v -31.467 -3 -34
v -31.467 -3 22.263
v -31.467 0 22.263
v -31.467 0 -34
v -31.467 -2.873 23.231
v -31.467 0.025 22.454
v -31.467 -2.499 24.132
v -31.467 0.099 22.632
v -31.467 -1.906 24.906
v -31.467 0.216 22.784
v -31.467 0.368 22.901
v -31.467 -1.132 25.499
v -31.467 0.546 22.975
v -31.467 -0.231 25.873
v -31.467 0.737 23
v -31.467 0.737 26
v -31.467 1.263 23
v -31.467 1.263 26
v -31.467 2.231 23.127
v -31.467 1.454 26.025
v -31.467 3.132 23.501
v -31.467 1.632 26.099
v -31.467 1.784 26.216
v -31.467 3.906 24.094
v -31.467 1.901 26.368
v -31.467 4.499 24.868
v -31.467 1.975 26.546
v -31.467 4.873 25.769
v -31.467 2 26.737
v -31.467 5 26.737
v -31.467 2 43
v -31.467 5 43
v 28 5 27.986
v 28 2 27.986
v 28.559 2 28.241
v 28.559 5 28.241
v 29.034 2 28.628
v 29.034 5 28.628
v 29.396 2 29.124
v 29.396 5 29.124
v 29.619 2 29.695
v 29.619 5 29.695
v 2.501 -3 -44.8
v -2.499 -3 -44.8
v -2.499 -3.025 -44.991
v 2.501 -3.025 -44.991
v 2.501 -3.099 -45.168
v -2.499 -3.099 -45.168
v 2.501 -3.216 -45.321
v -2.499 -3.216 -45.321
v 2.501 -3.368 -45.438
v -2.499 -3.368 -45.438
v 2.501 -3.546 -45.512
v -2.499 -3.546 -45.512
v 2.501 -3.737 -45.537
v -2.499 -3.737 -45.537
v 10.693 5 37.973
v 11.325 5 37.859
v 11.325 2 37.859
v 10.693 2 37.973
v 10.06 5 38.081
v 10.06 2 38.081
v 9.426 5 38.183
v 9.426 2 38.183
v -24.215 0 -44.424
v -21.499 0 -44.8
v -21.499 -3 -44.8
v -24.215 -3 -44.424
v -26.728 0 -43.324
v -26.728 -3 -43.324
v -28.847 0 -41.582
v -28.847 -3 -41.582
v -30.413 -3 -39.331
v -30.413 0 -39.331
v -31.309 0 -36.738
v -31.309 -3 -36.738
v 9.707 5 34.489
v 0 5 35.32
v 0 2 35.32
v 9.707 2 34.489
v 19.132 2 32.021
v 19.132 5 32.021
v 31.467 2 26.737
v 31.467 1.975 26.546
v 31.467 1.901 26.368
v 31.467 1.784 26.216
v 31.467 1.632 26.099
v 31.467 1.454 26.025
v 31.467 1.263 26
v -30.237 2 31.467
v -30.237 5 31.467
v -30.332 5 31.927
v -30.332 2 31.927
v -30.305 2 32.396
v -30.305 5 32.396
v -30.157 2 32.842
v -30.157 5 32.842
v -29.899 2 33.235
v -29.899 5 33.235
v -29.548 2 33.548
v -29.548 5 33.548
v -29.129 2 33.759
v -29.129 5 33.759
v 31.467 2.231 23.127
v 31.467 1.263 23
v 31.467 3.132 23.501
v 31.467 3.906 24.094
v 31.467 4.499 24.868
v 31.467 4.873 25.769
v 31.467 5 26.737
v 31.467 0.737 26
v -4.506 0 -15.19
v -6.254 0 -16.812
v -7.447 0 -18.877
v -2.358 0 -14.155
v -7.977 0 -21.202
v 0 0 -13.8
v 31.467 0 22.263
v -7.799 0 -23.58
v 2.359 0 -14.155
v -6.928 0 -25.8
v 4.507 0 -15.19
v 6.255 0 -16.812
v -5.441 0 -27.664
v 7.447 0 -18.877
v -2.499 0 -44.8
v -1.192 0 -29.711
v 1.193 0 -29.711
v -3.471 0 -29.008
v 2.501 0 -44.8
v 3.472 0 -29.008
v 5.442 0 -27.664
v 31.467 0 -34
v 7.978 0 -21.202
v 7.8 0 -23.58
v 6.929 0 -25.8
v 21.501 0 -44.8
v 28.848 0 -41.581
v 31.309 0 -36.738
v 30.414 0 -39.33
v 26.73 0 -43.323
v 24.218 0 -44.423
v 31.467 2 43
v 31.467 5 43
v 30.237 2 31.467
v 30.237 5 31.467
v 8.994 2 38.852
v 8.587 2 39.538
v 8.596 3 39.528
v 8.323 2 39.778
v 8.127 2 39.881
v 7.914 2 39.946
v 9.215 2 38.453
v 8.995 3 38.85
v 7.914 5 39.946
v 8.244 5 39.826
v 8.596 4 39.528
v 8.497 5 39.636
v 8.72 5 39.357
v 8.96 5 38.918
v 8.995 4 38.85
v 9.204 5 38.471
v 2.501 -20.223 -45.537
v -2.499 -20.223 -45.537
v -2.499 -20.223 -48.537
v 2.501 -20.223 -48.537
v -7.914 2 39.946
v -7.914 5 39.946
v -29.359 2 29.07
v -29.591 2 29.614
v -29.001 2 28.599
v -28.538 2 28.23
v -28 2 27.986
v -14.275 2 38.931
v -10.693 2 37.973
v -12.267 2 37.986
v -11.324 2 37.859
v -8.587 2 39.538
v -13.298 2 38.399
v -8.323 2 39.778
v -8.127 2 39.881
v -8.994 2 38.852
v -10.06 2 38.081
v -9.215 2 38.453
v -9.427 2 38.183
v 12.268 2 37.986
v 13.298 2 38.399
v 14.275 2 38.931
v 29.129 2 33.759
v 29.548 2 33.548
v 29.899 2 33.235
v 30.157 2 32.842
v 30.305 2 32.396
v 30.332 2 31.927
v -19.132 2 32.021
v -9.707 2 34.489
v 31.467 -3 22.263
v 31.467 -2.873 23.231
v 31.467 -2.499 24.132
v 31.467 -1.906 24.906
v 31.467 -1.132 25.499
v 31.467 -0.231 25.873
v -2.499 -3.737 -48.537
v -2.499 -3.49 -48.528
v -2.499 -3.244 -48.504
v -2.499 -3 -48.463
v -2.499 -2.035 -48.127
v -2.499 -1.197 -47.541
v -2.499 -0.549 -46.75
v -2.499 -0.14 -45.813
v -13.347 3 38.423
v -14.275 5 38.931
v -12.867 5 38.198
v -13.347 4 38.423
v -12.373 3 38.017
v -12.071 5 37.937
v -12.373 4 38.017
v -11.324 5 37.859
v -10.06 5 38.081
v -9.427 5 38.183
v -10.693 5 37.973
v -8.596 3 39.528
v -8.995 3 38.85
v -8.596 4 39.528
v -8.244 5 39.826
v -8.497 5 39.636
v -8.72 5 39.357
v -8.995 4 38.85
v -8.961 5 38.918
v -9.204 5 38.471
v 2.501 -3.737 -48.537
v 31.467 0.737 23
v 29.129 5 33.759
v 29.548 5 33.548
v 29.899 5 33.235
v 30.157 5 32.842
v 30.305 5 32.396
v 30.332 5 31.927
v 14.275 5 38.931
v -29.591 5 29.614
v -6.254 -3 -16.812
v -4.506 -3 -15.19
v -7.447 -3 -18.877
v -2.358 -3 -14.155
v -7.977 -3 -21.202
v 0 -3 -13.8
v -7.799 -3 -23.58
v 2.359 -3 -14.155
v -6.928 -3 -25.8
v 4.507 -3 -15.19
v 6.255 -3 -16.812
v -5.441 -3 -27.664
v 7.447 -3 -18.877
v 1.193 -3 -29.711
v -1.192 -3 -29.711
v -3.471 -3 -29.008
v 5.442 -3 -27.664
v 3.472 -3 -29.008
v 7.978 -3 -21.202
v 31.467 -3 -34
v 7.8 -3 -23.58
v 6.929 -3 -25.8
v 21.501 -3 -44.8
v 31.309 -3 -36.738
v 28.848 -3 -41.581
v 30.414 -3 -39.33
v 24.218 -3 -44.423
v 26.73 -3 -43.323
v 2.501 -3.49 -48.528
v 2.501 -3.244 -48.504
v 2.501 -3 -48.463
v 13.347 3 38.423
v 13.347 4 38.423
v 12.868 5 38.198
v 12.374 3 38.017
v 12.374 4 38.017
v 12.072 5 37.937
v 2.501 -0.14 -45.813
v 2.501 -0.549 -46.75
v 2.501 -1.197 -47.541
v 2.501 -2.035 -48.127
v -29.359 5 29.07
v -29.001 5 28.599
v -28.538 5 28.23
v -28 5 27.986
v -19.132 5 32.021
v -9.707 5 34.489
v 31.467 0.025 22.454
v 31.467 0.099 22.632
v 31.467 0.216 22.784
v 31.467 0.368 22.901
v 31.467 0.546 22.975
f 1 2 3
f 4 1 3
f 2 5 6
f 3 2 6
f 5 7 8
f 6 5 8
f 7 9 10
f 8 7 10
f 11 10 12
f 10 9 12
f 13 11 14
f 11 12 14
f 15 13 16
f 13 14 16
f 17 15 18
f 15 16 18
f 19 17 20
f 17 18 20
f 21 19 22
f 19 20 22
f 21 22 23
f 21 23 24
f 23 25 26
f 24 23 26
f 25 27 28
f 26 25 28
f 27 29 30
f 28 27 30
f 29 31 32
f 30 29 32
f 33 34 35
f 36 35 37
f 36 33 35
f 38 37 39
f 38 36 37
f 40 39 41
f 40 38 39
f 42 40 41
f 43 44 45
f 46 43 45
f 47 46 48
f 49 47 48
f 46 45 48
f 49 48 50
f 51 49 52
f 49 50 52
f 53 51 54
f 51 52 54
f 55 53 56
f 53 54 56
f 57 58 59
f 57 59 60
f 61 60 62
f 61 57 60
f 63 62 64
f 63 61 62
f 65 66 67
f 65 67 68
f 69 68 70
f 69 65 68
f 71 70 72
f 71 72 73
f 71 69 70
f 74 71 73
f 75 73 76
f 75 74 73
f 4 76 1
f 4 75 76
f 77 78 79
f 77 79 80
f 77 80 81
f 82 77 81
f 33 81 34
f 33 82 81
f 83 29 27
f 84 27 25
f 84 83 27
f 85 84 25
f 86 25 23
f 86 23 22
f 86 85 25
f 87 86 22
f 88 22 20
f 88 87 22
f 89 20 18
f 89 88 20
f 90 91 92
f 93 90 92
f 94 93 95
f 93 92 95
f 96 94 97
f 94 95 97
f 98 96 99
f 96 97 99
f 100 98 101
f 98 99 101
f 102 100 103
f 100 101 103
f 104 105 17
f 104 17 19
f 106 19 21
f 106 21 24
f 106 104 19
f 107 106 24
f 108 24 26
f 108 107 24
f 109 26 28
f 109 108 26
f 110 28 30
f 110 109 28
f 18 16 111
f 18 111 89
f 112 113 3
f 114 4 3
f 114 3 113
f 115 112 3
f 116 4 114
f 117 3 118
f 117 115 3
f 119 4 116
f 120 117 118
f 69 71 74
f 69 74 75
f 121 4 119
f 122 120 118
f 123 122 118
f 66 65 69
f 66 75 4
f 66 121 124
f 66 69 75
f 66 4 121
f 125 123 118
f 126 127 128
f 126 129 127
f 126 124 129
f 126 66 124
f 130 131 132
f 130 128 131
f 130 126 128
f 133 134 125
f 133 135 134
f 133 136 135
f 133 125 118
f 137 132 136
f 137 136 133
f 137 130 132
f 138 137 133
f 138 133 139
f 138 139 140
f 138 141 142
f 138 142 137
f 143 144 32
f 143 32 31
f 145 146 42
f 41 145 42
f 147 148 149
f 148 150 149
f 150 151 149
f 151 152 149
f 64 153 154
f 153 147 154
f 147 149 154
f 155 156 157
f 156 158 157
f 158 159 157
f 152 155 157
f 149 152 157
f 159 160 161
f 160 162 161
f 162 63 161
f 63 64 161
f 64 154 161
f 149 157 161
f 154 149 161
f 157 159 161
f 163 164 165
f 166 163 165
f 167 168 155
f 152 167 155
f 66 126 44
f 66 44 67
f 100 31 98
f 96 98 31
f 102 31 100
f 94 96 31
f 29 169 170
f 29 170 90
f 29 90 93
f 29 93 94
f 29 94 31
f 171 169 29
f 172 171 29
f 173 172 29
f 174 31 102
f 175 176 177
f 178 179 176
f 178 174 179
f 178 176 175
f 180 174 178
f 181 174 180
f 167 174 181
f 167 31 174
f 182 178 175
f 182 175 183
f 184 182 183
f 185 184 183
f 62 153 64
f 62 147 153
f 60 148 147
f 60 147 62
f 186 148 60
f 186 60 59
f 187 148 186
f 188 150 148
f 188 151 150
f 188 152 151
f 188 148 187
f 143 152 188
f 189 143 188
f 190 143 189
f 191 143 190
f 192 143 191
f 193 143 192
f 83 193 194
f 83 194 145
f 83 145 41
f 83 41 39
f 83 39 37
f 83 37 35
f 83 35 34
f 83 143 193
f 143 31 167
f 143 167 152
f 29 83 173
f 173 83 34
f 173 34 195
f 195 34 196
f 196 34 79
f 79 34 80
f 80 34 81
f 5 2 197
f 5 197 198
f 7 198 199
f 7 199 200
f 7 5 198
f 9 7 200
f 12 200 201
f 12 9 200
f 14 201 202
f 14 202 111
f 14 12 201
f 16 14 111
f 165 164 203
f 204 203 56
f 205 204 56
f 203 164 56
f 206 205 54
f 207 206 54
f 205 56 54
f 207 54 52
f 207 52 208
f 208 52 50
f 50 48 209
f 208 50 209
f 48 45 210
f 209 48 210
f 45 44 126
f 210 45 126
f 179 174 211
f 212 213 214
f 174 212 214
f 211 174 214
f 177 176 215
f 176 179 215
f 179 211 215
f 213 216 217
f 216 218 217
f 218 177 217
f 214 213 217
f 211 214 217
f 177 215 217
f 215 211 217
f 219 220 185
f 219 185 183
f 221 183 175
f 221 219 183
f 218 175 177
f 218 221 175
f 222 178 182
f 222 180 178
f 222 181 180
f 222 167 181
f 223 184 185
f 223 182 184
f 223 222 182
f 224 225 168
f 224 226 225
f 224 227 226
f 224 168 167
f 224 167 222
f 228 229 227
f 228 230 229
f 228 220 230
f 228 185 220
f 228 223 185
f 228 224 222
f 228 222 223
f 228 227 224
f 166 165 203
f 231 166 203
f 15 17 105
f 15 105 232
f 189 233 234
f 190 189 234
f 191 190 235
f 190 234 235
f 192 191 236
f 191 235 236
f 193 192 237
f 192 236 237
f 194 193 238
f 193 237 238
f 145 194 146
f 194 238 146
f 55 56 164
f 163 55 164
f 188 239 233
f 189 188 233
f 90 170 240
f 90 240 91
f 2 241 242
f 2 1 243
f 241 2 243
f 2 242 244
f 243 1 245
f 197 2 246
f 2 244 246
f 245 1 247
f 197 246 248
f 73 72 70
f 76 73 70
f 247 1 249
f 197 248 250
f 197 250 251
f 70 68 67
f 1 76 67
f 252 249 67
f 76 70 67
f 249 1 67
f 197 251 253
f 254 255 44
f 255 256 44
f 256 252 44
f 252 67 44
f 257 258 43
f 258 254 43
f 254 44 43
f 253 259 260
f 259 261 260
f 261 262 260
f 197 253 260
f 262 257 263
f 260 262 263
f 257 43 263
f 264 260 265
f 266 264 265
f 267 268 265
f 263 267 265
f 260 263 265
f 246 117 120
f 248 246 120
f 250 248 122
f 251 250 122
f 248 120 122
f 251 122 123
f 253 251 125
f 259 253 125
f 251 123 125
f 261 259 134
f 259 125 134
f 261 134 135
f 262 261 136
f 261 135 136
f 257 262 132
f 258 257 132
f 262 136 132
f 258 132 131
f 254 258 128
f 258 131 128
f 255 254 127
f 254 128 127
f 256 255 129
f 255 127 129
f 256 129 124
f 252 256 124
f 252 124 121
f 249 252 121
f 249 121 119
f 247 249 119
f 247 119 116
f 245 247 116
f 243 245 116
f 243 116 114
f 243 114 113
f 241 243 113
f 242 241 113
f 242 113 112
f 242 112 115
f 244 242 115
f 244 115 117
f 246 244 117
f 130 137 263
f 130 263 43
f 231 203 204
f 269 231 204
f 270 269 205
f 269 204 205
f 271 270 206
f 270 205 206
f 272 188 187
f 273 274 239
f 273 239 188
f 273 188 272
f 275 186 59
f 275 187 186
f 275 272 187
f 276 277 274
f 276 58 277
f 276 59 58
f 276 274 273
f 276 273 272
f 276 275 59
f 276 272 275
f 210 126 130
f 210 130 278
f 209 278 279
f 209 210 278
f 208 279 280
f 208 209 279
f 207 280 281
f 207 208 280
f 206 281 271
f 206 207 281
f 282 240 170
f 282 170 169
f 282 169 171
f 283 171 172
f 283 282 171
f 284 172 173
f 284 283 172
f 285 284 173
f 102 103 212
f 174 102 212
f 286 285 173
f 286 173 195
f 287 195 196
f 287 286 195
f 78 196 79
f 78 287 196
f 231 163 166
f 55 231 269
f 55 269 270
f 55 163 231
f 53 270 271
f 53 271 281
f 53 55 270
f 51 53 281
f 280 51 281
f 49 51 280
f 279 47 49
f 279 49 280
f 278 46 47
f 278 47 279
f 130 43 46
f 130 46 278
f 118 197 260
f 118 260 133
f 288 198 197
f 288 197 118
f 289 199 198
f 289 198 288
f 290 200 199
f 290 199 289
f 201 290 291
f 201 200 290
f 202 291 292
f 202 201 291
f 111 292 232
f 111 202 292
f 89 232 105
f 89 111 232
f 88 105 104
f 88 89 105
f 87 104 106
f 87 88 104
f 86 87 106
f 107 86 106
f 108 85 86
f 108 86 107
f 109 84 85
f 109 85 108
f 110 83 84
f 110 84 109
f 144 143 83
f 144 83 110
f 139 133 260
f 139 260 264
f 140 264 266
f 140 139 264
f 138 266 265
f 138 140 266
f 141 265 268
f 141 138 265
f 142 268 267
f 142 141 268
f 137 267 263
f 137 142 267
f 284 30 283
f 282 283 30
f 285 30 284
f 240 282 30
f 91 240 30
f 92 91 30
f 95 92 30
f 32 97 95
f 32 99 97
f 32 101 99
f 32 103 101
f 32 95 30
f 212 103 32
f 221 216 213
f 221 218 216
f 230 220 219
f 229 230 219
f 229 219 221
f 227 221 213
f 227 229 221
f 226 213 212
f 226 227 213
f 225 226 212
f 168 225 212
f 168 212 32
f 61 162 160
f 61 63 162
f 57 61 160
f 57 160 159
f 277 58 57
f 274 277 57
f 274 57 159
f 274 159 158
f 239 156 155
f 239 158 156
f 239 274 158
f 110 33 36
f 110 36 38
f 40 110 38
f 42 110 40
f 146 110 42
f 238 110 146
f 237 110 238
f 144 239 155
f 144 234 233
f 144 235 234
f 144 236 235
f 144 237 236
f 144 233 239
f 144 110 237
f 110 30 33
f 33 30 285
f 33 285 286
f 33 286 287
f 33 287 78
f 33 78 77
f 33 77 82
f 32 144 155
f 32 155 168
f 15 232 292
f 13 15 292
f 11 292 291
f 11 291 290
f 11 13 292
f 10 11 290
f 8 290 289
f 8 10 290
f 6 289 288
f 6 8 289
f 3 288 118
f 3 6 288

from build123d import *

# Parameters (mm, degrees)
BASE_FLANGE1_DEPTH           = 3
SKETCH2_R                    = 8
CUT_EXTRUDE1_DEPTH           = 73.112420355
EDGE_FLANGE1_STRIP_W         = 13.4732
EDGE_FLANGE1_STRIP_H         = 3
EDGE_FLANGE1_STRIP_CUT_DEPTH = 62.933077126
EDGE_FLANGE1_DEPTH           = 62.933077126
EDGE_FLANGE2_STRIP_W         = 13.4732
EDGE_FLANGE2_STRIP_H         = 3
EDGE_FLANGE2_STRIP_CUT_DEPTH = 62.933077126
EDGE_FLANGE2_DEPTH           = 62.933077126
CUT_EXTRUDE14_DEPTH          = 73.492766325
CUT_EXTRUDE15_DEPTH          = 73.492766325
CUT_EXTRUDE16_DEPTH          = 73.492766325
SKETCHED_START               = -2.498589927
SKETCHED_BEND2_DEPTH         = 5
SKETCHED_BEND2_2_DEPTH       = 5


# Read off the part's stored shape, not the designer's step: Sketched Bend2
# Sheet-metal steps are written as plain solids
with BuildPart() as part:
    # Sketch1 → Base-Flange1 (new body)
    with BuildSketch(Plane(origin=(0, 0, 0), x_dir=(1, 0, 0), z_dir=(0, 1, 0))):
        with BuildLine():
            Line((2.501410073, 64.8), (-2.498589927, 64.8))
            Line((-2.498589927, 64.8), (-2.498589927, 44.8))
            Line((-2.498589927, 44.8), (-21.498589927, 44.8))
            ThreePointArc((-21.498589927, 44.8), (-28.847059156, 41.582329983), (-31.466538563, 34))
            Line((-31.466538563, 34), (-31.466538563, -26))
            Line((-31.466538563, -26), (31.466538563, -26))
            Line((31.466538563, -26), (31.466538563, 34))
            ThreePointArc((31.466538563, 34), (28.848015597, 41.581293991), (21.501410073, 44.8))
            Line((21.501410073, 44.8), (2.501410073, 44.8))
            Line((2.501410073, 44.8), (2.501410073, 64.8))
        make_face()
    extrude(amount=-BASE_FLANGE1_DEPTH)

    # Sketch2 → Cut-Extrude1 (cut, through all)
    with BuildSketch(Plane(origin=(0, 0, 0), x_dir=(1, 0, 0), z_dir=(0, 1, 0))):
        with Locations(Location((0.000474376, 21.8, 0), (0, 0, 270))):
            Circle(SKETCH2_R)
    extrude(amount=-CUT_EXTRUDE1_DEPTH, mode=Mode.SUBTRACT)

    # Edge-Flange1 strip (across the edge) → Edge-Flange1 strip cut (cut)
    with BuildSketch(Plane(origin=(-31.466538563, 0, 26), x_dir=(0, 0, -1), z_dir=(1, 0, 0))):
        with Locations((-3, -1.5)):
            Rectangle(EDGE_FLANGE1_STRIP_W, EDGE_FLANGE1_STRIP_H)
    extrude(amount=EDGE_FLANGE1_STRIP_CUT_DEPTH, mode=Mode.SUBTRACT)

    # Edge-Flange1 section (across the edge) → Edge-Flange1 (add)
    with BuildSketch(Plane(origin=(-31.466538563, 0, 26), x_dir=(0, 0, -1), z_dir=(1, 0, 0))):
        with BuildLine():
            Line((0, 0.7366), (0, 2))
            Line((0, 2), (3, 2))
            Line((3, 2), (3, 0.7366))
            ThreePointArc((3, 0.7366), (3.215745145, 0.215745145), (3.7366, 0))
            Line((3.7366, 0), (3.7366, -3))
            ThreePointArc((3.7366, -3), (1.094424801, -1.905575199), (0, 0.7366))
        make_face()
    extrude(amount=EDGE_FLANGE1_DEPTH)

    # Edge-Flange2 strip (across the edge) → Edge-Flange2 strip cut (cut)
    with BuildSketch(Plane(origin=(31.466538563, 2, 26), x_dir=(0, -1, 0), z_dir=(-1, 0, 0))):
        with Locations((-6, -1.5)):
            Rectangle(EDGE_FLANGE2_STRIP_W, EDGE_FLANGE2_STRIP_H)
    extrude(amount=EDGE_FLANGE2_STRIP_CUT_DEPTH, mode=Mode.SUBTRACT)

    # Edge-Flange2 section (across the edge) → Edge-Flange2 (add)
    with BuildSketch(Plane(origin=(31.466538563, 2, 26), x_dir=(0, -1, 0), z_dir=(-1, 0, 0))):
        with BuildLine():
            Line((-3, 0.7366), (-3, 17))
            Line((-3, 17), (0, 17))
            Line((0, 17), (0, 0.7366))
            ThreePointArc((0, 0.7366), (0.215745145, 0.215745145), (0.7366, 0))
            Line((0.7366, 0), (0.7366, -3))
            ThreePointArc((0.7366, -3), (-1.905575199, -1.905575199), (-3, 0.7366))
        make_face()
    extrude(amount=EDGE_FLANGE2_DEPTH)

    # Sketch10 → Cut-Extrude14 (cut, through all)
    with BuildSketch(Plane(origin=(0, 5, 0), x_dir=(1, 0, 0), z_dir=(0, 1, 0))):
        with BuildLine():
            ThreePointArc((-27.999525624, -27.986488127), (-14.471973254, -33.456154948), (0, -35.319999998))
            ThreePointArc((0, -35.319999998), (14.472463109, -33.456275138), (28.000474376, -27.986488127))
            ThreePointArc((28.000474376, -27.986488127), (29.507543106, -29.356635577), (29.415737967, -31.391367011))
            ThreePointArc((29.415737967, -31.391367011), (26.522239798, -32.891637528), (23.552482739, -34.23465141))
            ThreePointArc((23.552482739, -34.23465141), (12.025251123, -37.723725926), (0.039934977, -38.908169509))
            ThreePointArc((0.039934977, -38.908169509), (-11.98559581, -37.731400069), (-23.551533984, -34.234651411))
            ThreePointArc((-23.551533984, -34.234651411), (-26.516212861, -32.894099815), (-29.404911166, -31.396828455))
            ThreePointArc((-29.404911166, -31.396828455), (-29.503369191, -29.361507737), (-27.999525624, -27.986488127))
        make_face()
    extrude(amount=-CUT_EXTRUDE14_DEPTH, mode=Mode.SUBTRACT)

    # Sketch12 → Cut-Extrude15 (cut, through all)
    with BuildSketch(Plane(origin=(0, 5, 0), x_dir=(1, 0, 0), z_dir=(0, 1, 0))):
        with BuildLine():
            add(Edge.make_bspline(
                [(-7.914237019, -39.945550294), (-8.841345223, -39.749796487), (-8.874121397, -38.753829984), (-9.426515507, -38.182603627)],
                knots=[0, 0, 0, 0, 0.911940572, 0.911940572, 0.911940572, 0.911940572], degree=3))
            Line((-7.914237019, -39.945550294), (0, -39.945550294))
            Line((0, -39.945550294), (0, -38.908175729))
            ThreePointArc((0, -38.908175729), (-4.727168745, -38.726119033), (-9.426515507, -38.182603627))
        make_face()
        with BuildLine():
            add(Edge.make_bspline(
                [(-9.426515507, -38.182603627), (-9.479856164, -38.127444478), (-9.538041922, -38.076245756), (-9.602345878, -38.030110388)],
                knots=[0.911940572, 0.911940572, 0.911940572, 0.911940572, 1, 1, 1, 1], degree=3))
            ThreePointArc((-9.426515507, -38.182603627), (-4.727168745, -38.726119033), (0, -38.908175729))
            Line((0, -38.908175729), (0, -38.030110388))
            Line((0, -38.030110388), (-9.602345878, -38.030110388))
        make_face()
        with BuildLine():
            Line((0, -38.030110388), (0, -38.908175729))
            ThreePointArc((0, -38.908175729), (0.019967489, -38.908175848), (0.039934977, -38.908169509))
            ThreePointArc((0.039934977, -38.908169509), (4.746985688, -38.724674098), (9.42633967, -38.182785492))
            add(Edge.make_bspline(
                [(9.42633967, -38.182785492), (9.479728286, -38.127557013), (9.537971255, -38.076296456), (9.602345878, -38.030110388)],
                knots=[0.9118438, 0.9118438, 0.9118438, 0.9118438, 1, 1, 1, 1], degree=3))
            Line((9.602345878, -38.030110388), (0, -38.030110388))
        make_face()
        with BuildLine():
            Line((0, -38.908175729), (0, -39.945550294))
            Line((0, -39.945550294), (7.914237019, -39.945550294))
            add(Edge.make_bspline(
                [(7.914237019, -39.945550294), (8.841246841, -39.74981726), (8.874114431, -38.754041352), (9.42633967, -38.182785492)],
                knots=[0, 0, 0, 0, 0.9118438, 0.9118438, 0.9118438, 0.9118438], degree=3))
            ThreePointArc((9.42633967, -38.182785492), (4.746985688, -38.724674098), (0.039934977, -38.908169509))
            ThreePointArc((0.039934977, -38.908169509), (0.019967489, -38.908175848), (0, -38.908175729))
        make_face()
    extrude(amount=-CUT_EXTRUDE15_DEPTH, mode=Mode.SUBTRACT)

    # Sketch13 → Cut-Extrude16 (cut, through all)
    with BuildSketch(Plane(origin=(0, 5, 0), x_dir=(1, 0, 0), z_dir=(0, 1, 0))):
        with BuildLine():
            Line((-29.503369191, -29.361507737), (-30.236500006, -31.46681125))
            ThreePointArc((-30.236500006, -31.46681125), (-30.1571885, -32.842186741), (-29.128569459, -33.758642374))
            Line((-29.128569459, -33.758642374), (-14.274829355, -38.931167152))
            add(Edge.make_bspline(
                [(-14.274829355, -38.931167152), (-13.356001391, -38.419364556), (-12.413528872, -37.83920993), (-11.311548038, -37.858876708)],
                knots=[0, 0, 0, 0, 1, 1, 1, 1], degree=3))
            Line((-11.311548038, -37.858876708), (-10.639965658, -35.930319464))
            Line((-10.639965658, -35.930319464), (-29.503369191, -29.361507737))
        make_face()
        with BuildLine():
            Line((10.639965658, -35.930319464), (11.311548038, -37.858876708))
            add(Edge.make_bspline(
                [(14.274829355, -38.931167152), (13.356001391, -38.419364556), (12.413528872, -37.83920993), (11.311548038, -37.858876708)],
                knots=[0, 0, 0, 0, 1, 1, 1, 1], degree=3))
            Line((14.274829355, -38.931167152), (29.128569459, -33.758642374))
            ThreePointArc((29.128569459, -33.758642374), (30.1571885, -32.842186741), (30.236500006, -31.46681125))
            Line((30.236500006, -31.46681125), (29.503369191, -29.361507737))
            Line((29.503369191, -29.361507737), (10.639965658, -35.930319464))
        make_face()
    extrude(amount=-CUT_EXTRUDE16_DEPTH, mode=Mode.SUBTRACT)

    # Sketched Bend2 outline → Sketched Bend2 (cut)
    with BuildSketch(Plane.YZ.offset(SKETCHED_START)):
        with BuildLine():
            ThreePointArc((0, -44.8), (-0.845704021, -47.167467001), (-3, -48.463277222))
            Line((-3, -48.463277222), (-3, -64.8))
            Line((-3, -64.8), (0, -64.8))
            Line((0, -64.8), (0, -44.8))
        make_face()
    extrude(amount=SKETCHED_BEND2_DEPTH, mode=Mode.SUBTRACT)

    # Sketched Bend2 2 outline → Sketched Bend2 2 (add)
    with BuildSketch(Plane.YZ.offset(SKETCHED_START)):
        with BuildLine():
            ThreePointArc((-3, -44.8), (-3.215745145, -45.320854855), (-3.7366, -45.5366))
            Line((-3.7366, -45.5366), (-20.223356935, -45.5366))
            Line((-20.223356935, -45.5366), (-20.223356935, -48.5366))
            Line((-20.223356935, -48.5366), (-3.7366, -48.5366))
            ThreePointArc((-3.7366, -48.5366), (-3.36647982, -48.518224121), (-3, -48.463277222))
            Line((-3, -48.463277222), (-3, -44.8))
        make_face()
    extrude(amount=SKETCHED_BEND2_2_DEPTH)


solid = part.part
